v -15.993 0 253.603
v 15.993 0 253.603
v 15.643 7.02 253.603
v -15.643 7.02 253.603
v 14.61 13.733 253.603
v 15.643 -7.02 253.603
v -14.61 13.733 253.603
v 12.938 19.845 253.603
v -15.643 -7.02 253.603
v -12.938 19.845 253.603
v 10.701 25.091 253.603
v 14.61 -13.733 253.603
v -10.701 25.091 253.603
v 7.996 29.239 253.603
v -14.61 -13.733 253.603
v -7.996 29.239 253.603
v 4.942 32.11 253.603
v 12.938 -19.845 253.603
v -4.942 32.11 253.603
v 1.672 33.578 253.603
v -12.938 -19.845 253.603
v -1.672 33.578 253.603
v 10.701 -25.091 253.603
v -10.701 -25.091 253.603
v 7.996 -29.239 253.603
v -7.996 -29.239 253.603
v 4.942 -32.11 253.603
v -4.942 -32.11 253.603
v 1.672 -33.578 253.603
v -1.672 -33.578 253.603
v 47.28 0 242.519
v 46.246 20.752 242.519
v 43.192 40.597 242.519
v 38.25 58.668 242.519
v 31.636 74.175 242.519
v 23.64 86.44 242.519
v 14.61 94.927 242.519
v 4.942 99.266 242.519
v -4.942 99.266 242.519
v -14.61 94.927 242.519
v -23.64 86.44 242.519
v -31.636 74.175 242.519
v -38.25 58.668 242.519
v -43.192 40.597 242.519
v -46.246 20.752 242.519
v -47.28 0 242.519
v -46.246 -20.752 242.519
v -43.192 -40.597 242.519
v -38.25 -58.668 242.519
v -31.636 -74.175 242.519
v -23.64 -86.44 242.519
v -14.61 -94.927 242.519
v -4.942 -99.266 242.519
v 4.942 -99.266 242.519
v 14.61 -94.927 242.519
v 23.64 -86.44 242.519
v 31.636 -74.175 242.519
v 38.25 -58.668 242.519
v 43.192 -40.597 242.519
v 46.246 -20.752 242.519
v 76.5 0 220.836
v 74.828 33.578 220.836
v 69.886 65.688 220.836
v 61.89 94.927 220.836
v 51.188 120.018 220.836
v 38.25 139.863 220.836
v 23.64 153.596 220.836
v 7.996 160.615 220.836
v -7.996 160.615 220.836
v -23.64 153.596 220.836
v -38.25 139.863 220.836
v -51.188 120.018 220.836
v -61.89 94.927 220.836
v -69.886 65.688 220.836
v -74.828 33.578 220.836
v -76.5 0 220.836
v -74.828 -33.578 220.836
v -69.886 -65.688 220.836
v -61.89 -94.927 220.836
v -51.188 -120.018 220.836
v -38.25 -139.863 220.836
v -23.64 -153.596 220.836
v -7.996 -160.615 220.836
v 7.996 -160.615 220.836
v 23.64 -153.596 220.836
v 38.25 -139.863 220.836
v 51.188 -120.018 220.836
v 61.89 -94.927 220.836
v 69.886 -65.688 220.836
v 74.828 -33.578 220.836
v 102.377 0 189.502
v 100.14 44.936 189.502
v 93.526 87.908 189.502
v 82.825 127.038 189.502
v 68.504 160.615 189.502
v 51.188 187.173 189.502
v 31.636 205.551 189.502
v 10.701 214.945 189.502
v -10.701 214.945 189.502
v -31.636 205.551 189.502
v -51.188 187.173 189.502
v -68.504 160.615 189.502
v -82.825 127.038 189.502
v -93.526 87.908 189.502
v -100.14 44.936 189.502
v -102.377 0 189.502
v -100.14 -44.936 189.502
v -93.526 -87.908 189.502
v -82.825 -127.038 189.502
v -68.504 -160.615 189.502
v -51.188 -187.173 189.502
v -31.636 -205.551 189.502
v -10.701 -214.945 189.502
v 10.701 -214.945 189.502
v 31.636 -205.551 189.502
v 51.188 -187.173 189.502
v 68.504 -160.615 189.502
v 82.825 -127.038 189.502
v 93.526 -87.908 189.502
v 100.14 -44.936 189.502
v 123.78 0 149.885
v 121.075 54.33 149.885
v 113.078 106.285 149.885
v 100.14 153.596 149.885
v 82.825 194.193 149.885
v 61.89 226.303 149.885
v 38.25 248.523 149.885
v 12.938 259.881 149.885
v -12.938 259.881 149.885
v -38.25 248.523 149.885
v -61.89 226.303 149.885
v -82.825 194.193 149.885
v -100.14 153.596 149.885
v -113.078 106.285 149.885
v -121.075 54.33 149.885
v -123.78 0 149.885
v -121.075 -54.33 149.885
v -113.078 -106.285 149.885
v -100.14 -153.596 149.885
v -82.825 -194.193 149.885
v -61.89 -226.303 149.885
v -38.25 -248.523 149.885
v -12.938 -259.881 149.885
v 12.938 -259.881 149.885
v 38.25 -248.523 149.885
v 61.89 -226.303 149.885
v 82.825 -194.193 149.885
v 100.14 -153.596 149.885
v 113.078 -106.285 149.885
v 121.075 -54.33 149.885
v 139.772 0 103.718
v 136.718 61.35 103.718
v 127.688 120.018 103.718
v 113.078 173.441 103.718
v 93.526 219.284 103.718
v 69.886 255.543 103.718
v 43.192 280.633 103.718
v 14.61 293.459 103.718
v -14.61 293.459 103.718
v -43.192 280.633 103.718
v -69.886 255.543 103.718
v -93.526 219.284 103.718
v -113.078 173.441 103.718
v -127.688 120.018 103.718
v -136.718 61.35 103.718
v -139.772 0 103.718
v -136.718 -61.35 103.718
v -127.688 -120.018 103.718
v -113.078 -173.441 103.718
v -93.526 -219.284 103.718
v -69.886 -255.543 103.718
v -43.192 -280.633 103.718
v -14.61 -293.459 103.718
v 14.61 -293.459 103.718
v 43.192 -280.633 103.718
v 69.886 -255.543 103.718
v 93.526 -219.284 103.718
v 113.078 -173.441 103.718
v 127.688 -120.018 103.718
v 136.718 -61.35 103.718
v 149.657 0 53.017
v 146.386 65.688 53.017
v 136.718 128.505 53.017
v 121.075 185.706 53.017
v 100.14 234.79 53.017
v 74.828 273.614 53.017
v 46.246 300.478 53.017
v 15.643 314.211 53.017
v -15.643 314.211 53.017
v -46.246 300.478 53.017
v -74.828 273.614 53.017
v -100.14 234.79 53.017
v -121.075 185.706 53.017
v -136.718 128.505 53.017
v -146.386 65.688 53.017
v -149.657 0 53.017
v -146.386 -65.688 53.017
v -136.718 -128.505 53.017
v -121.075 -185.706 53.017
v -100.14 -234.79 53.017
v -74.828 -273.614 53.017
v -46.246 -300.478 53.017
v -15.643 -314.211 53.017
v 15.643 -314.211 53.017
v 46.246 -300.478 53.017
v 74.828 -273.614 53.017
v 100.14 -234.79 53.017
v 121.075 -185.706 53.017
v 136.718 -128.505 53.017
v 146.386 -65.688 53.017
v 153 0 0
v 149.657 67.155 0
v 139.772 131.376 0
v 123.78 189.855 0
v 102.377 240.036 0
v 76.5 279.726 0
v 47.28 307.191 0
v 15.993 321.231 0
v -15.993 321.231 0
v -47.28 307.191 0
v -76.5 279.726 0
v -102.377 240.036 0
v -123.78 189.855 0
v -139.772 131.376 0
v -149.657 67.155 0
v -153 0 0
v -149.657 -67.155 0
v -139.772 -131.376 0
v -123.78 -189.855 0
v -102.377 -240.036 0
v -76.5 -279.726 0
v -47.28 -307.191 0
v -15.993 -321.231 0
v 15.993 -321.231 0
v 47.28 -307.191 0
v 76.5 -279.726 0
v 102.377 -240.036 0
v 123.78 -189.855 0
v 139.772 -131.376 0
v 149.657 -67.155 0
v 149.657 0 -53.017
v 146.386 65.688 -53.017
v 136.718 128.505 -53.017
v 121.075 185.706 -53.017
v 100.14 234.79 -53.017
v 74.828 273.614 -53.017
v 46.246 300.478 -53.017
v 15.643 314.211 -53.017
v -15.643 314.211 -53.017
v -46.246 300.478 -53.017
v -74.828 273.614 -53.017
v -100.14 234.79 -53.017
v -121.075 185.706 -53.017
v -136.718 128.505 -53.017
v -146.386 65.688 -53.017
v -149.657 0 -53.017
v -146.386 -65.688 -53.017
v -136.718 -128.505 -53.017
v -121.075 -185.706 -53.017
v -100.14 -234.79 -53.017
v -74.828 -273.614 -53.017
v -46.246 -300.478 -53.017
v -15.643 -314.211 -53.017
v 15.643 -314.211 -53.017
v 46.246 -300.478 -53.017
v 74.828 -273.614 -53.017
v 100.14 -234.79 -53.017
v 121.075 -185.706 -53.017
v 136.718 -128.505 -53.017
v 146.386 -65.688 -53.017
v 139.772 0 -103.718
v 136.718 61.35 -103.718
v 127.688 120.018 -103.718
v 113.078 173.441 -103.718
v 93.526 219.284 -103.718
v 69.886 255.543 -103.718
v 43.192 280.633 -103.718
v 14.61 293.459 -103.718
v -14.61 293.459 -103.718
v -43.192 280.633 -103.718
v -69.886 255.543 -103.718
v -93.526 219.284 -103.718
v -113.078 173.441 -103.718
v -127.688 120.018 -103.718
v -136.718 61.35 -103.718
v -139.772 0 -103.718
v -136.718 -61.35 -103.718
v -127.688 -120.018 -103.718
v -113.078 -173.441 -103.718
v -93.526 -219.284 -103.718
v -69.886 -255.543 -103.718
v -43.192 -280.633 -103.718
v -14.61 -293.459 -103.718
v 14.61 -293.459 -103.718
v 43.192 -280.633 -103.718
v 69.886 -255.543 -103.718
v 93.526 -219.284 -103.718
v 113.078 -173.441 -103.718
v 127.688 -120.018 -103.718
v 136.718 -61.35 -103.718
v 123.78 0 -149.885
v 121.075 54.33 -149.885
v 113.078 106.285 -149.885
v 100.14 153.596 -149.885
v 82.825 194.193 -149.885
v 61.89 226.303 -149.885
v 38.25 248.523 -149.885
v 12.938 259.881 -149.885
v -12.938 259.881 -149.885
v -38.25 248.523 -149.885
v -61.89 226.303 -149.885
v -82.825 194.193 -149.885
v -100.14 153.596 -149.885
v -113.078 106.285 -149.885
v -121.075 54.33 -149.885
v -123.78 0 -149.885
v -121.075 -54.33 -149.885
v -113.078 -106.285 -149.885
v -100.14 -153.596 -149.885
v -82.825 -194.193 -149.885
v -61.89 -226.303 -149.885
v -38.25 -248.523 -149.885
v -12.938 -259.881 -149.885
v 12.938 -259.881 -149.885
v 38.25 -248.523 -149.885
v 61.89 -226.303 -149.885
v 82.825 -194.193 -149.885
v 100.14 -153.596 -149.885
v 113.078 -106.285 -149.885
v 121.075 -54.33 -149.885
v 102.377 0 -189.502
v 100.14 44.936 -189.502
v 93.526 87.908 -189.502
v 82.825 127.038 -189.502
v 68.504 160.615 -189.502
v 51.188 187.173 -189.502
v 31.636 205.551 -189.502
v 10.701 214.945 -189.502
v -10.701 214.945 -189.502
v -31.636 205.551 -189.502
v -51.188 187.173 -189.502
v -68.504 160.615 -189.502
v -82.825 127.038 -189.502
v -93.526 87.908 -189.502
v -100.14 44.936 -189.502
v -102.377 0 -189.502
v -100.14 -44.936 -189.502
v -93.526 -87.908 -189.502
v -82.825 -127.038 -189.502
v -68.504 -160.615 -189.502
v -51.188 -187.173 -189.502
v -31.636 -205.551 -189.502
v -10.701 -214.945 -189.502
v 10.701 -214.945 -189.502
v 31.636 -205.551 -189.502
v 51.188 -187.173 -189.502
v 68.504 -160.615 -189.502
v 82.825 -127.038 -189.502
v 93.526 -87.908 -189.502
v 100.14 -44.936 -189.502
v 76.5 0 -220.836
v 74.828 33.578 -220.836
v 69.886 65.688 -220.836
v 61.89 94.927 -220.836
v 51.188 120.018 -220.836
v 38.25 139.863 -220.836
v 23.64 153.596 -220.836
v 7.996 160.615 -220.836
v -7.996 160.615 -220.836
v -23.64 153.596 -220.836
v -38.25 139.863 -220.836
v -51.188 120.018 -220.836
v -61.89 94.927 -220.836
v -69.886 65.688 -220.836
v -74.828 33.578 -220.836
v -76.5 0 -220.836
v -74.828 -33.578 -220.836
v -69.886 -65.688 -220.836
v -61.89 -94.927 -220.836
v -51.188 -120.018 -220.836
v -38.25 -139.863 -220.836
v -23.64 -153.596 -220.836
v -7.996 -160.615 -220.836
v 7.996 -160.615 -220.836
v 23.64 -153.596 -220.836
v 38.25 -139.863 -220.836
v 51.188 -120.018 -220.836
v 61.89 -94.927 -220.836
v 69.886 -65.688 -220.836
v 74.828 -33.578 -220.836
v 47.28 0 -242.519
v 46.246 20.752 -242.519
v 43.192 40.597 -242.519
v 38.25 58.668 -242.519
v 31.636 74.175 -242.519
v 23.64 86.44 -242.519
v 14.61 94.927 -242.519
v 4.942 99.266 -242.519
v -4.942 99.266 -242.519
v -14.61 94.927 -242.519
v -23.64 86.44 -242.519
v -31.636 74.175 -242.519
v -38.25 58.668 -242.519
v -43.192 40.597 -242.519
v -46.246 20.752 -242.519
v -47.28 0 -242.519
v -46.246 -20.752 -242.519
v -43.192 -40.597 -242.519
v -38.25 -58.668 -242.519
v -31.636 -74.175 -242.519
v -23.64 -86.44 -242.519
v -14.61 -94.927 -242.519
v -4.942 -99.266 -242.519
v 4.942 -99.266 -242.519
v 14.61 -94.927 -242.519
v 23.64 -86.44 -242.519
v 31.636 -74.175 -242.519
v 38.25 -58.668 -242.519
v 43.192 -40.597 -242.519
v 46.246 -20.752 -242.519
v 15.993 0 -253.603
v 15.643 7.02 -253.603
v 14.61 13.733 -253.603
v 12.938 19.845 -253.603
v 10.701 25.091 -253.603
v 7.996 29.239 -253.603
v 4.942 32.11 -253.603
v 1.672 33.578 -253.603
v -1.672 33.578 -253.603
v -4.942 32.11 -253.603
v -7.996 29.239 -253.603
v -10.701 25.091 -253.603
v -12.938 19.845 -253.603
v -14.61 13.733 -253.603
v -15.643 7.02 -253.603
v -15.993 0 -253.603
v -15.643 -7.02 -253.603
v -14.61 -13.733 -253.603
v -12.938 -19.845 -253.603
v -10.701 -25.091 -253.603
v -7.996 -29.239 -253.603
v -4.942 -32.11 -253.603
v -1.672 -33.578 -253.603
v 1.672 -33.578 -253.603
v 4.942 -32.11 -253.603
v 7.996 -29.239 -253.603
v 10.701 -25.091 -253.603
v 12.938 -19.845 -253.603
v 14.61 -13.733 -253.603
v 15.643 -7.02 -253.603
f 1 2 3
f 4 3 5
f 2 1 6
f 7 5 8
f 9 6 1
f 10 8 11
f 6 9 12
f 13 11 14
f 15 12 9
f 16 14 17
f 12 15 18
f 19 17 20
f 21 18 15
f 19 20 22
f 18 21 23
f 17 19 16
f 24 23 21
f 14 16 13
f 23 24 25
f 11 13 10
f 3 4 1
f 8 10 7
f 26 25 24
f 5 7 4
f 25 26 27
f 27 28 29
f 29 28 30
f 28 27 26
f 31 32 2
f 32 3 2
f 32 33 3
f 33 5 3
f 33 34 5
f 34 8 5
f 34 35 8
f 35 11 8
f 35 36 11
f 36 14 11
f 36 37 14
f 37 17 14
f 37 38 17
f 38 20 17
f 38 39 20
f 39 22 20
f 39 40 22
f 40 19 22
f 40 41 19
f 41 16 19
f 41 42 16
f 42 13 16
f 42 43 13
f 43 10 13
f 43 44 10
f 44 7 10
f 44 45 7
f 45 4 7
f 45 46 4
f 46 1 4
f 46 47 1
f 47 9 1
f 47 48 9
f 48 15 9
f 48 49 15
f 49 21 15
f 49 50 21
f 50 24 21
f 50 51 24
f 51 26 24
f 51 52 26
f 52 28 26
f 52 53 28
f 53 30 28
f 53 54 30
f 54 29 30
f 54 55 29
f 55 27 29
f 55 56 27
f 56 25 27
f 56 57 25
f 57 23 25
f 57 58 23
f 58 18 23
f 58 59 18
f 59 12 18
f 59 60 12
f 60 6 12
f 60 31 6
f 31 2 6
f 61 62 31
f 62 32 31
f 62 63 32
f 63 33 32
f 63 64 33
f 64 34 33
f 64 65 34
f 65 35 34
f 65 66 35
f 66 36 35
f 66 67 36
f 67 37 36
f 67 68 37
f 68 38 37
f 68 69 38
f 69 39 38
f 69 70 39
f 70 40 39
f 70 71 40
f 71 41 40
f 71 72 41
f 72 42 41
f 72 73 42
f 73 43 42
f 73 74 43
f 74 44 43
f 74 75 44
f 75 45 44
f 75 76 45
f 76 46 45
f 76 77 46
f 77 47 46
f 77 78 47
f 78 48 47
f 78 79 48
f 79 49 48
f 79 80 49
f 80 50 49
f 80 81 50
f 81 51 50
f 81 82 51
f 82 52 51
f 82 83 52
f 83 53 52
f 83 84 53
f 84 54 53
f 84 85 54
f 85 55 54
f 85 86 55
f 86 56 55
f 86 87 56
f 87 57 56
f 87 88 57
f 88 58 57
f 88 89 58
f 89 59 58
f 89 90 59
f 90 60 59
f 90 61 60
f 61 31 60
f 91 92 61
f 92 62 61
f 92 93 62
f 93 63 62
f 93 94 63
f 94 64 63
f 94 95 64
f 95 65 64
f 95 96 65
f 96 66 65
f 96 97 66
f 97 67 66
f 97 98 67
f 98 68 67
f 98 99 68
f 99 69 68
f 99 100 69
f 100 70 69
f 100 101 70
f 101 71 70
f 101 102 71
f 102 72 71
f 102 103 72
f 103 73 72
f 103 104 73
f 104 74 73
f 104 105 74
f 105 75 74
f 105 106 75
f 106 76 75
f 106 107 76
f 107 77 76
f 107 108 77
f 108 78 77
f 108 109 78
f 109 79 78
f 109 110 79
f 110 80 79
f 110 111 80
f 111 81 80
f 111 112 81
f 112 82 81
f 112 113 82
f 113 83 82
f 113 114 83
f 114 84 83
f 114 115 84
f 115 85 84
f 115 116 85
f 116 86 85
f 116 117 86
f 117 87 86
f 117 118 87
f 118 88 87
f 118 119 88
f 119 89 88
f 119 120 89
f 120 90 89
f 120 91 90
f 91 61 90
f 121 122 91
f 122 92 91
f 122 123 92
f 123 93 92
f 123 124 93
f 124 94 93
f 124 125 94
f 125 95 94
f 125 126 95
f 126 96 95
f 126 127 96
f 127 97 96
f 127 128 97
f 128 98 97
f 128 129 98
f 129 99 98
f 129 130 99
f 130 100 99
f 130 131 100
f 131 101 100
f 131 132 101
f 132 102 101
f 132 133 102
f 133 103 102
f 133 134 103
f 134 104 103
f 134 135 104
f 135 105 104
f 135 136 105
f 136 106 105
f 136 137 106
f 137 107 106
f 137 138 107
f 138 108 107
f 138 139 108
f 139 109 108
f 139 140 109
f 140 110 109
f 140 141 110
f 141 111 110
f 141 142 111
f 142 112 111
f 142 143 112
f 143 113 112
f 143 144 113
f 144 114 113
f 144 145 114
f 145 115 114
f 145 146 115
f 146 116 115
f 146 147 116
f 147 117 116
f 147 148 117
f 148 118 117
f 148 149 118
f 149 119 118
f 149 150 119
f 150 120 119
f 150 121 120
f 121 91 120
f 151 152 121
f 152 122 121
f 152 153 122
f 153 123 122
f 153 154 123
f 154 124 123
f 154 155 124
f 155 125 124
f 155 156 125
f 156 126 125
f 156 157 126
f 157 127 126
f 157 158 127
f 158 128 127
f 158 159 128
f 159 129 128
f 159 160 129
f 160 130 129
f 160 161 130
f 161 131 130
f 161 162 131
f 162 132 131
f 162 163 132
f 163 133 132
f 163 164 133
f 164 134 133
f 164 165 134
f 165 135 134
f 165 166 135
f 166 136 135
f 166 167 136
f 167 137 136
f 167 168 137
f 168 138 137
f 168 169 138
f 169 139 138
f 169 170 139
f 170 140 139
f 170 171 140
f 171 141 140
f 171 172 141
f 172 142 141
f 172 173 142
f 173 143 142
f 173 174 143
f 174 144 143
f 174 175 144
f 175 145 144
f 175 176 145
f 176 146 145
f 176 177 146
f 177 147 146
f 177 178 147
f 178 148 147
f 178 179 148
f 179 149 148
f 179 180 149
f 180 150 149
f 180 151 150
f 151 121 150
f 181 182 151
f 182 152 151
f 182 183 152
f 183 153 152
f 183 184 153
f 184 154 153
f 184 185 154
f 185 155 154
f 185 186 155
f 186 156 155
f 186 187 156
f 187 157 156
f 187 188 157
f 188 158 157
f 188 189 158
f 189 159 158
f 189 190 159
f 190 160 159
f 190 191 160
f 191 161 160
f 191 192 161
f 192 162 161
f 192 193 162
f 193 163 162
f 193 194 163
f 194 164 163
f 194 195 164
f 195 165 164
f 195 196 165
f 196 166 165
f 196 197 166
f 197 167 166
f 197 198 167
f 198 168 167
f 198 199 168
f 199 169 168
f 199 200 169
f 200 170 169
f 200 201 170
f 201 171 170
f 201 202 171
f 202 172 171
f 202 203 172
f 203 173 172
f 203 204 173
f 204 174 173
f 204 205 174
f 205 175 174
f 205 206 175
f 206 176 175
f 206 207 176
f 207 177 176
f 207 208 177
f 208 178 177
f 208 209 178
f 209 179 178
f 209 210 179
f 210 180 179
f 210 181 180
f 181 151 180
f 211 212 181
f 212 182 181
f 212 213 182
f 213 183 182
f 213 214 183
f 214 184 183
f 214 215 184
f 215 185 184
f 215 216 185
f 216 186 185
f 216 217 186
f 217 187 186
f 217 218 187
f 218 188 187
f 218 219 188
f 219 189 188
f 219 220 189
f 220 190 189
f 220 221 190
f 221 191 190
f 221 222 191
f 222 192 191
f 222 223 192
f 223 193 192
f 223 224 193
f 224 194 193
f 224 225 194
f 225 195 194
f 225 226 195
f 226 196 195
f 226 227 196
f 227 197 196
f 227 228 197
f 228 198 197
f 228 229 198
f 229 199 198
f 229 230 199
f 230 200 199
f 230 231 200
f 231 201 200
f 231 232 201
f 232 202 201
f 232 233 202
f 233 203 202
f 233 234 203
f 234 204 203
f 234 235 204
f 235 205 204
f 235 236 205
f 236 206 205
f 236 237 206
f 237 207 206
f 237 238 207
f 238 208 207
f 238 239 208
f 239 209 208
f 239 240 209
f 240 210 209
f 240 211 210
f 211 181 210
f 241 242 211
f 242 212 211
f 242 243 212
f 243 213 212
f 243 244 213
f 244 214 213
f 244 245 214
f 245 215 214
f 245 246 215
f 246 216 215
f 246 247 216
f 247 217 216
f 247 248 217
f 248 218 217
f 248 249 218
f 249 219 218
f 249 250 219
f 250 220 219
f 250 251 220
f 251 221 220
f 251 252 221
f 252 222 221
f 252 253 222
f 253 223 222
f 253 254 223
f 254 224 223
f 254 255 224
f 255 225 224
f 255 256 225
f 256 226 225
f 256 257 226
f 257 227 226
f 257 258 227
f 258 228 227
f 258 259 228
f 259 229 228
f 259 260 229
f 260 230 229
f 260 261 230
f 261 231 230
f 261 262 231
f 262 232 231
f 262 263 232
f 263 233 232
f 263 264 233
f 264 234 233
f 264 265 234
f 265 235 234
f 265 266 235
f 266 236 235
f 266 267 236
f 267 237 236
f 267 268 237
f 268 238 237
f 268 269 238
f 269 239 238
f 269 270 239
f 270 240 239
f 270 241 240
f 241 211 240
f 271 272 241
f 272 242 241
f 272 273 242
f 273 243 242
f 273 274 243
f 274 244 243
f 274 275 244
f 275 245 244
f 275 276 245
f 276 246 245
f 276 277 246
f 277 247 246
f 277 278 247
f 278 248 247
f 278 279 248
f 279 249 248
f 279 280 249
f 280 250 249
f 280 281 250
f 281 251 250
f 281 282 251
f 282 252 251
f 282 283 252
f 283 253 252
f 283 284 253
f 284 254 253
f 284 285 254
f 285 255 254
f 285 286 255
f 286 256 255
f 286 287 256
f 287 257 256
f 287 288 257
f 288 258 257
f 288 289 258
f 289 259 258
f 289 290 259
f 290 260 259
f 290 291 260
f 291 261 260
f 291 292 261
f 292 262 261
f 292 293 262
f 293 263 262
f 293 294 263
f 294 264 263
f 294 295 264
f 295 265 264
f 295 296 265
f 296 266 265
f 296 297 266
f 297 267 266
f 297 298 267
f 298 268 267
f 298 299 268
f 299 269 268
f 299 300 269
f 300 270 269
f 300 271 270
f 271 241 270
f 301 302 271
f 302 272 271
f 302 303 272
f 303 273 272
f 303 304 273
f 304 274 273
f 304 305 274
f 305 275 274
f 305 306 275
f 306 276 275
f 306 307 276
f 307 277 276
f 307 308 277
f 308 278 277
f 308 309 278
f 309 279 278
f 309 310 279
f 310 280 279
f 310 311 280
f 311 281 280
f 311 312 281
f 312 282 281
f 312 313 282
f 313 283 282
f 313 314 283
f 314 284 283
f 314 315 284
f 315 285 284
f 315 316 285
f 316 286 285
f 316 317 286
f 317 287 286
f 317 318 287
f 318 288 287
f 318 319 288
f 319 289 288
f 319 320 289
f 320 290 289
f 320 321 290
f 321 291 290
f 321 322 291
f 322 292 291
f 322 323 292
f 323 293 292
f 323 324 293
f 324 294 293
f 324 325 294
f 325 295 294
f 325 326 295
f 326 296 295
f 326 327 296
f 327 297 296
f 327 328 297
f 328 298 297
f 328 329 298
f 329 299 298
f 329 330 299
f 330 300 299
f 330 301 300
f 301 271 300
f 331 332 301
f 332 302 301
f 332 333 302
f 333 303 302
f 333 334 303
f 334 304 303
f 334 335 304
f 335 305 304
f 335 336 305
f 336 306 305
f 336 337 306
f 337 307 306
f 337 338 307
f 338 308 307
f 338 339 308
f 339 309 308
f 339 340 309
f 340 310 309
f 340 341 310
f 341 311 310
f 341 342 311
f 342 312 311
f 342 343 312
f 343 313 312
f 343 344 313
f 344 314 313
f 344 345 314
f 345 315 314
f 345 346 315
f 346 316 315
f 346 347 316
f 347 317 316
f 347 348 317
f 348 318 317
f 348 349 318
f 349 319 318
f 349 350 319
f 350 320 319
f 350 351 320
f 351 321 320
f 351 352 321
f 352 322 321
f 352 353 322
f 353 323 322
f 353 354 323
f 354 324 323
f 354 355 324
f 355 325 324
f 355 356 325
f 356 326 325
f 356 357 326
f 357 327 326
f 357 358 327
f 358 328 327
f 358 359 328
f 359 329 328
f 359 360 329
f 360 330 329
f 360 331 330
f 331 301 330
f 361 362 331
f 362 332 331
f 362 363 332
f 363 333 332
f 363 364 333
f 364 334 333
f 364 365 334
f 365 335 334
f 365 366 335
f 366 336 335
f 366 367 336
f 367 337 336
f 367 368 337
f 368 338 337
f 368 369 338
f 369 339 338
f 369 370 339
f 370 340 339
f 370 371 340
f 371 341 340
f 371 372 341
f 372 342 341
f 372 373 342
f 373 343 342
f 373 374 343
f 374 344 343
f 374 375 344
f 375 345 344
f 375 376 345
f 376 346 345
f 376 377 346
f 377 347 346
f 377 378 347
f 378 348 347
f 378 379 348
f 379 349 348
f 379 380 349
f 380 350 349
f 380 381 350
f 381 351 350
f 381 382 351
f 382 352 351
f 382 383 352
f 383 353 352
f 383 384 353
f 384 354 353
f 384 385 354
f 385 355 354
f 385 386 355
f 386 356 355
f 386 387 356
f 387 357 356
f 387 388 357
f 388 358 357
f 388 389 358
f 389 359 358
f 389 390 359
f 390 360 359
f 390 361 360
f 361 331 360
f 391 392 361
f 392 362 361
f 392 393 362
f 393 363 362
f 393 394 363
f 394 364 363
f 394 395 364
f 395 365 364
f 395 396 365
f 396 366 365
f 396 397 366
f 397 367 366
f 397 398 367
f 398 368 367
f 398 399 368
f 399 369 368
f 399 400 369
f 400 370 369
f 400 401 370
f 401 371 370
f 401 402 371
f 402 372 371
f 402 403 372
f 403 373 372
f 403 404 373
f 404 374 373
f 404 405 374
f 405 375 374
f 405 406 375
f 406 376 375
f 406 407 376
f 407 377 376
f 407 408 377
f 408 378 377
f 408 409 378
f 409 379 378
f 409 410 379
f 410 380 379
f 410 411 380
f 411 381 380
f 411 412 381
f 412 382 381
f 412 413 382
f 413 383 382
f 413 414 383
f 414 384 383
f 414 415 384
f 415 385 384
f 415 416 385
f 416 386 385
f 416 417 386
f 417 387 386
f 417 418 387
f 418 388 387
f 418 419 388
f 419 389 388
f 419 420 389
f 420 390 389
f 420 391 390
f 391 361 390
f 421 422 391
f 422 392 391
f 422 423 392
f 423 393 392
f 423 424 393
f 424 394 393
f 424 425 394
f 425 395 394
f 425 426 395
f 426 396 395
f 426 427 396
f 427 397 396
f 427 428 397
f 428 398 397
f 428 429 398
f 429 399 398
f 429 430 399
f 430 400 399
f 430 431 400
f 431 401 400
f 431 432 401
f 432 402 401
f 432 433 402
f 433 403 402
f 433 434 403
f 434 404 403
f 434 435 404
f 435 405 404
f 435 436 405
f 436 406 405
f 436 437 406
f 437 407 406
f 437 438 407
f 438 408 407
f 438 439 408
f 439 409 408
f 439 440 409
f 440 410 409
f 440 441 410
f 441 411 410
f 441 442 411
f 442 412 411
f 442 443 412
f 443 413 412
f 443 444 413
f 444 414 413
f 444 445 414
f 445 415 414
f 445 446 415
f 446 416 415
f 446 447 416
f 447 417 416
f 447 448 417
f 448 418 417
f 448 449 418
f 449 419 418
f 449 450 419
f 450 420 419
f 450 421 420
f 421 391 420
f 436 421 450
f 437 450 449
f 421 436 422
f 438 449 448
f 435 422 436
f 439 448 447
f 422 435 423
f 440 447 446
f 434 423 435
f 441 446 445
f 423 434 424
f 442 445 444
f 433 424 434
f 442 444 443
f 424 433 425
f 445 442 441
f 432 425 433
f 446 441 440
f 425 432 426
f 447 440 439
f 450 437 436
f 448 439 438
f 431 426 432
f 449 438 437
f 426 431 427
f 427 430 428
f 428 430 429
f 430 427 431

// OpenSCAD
// Generated by SolidPython 1.0.1 on 2020-07-29 00:46:49


scale(v = [9, 19, 15]) {
	sphere(r = 17);
}
/***********************************************
*********      SolidPython code:      **********
************************************************
 
# import packages: SolidPython
from solid import *
from solid.utils import *
from itertools import chain, combinations, permutations


class Resize:

    def __init__(self, scad_file):
        self.scad_file = scad_file
        #self.scad_file = import_scad(scad_file)
        # cone/cylinder param:
        self.r1 = 0
        self.r2 = 0
        self.h = 0
        # rectangular prism param:
        self.w = 0
        self.l = 0
        # ellipse param:
        self.r = 0

    # import OpenScad code (file name corresponds to shape)


    # classify shape + parameters
    def assign(self, param1, param2, param3):
        if self.scad_file == 'cone.scad':
            self.r1 = param1
            self.r2 = param2
            self.h = param3
        elif self.scad_file == 'cylinder.scad':
            self.r1 = param1
            self.r2 = param2
            self.h = param3
        elif self.scad_file == 'rectangularPrism.scad':
            self.h = param1
            self.l = param2
            self.w = param3
        else:
            self.r = param1
            self.h = param2

    # resize parameters
    def iterate(self):
        x = range(3, 20, 2)
        i = 1
        if self.scad_file == 'cone.scad':
            tempList = list(permutations(x, 2))
            for temp in tempList:
                param1 = temp[0]
                param2 = temp[1]
                filepath = 'produced_scad_files/' + 'cone' + str(param1) + '_' + str(param2) + '_' + '.scad'
                scad_render_to_file(cylinder(h=param1, r1=param2, r2=0), filepath)

        elif self.scad_file == 'cylinder.scad':
            tempList = list(permutations(x, 3))
            for temp in tempList:
                param1 = temp[0]
                param2 = temp[1]
                filepath = 'produced_scad_files/' + 'cylinder' + str(param1) + '_' + str(param2) + '_' + '.scad'
                scad_render_to_file(cylinder(h=param1, r1=param2, r2=param2), filepath)

        elif self.scad_file == 'rectangularPrism.scad':
            tempList = list(permutations(x, 3))
            for temp in tempList:
                param1 = temp[0]
                param2 = temp[1]
                param3 = temp[2]
                filepath = 'produced_scad_files/' + 'rectangularPrism' + str(param1) + '_' + str(param2) + '_' + str(
                    param3) + '.scad'
                scad_render_to_file(cube(size=(param1, param2, param3)), filepath)

        elif self.scad_file == 'ellipse.scad':
            tempList = list(permutations(x, 4))
            for temp in tempList:
                param1 = temp[0]
                param2 = temp[1]
                param3 = temp[2]
                param4 = temp[3]
                filepath = 'produced_scad_files/' + 'ellipse' + str(param1) + '_' + str(param2) + '_' + str(param3) + '_' + str(param4) + '.scad'
                scad_render_to_file(scale([param1, param2, param3])(sphere(r=param4)), filepath)

    def render_to_scadfile(self):
        scad_render_to_file(scad, 'example.scad') 
 
************************************************/
